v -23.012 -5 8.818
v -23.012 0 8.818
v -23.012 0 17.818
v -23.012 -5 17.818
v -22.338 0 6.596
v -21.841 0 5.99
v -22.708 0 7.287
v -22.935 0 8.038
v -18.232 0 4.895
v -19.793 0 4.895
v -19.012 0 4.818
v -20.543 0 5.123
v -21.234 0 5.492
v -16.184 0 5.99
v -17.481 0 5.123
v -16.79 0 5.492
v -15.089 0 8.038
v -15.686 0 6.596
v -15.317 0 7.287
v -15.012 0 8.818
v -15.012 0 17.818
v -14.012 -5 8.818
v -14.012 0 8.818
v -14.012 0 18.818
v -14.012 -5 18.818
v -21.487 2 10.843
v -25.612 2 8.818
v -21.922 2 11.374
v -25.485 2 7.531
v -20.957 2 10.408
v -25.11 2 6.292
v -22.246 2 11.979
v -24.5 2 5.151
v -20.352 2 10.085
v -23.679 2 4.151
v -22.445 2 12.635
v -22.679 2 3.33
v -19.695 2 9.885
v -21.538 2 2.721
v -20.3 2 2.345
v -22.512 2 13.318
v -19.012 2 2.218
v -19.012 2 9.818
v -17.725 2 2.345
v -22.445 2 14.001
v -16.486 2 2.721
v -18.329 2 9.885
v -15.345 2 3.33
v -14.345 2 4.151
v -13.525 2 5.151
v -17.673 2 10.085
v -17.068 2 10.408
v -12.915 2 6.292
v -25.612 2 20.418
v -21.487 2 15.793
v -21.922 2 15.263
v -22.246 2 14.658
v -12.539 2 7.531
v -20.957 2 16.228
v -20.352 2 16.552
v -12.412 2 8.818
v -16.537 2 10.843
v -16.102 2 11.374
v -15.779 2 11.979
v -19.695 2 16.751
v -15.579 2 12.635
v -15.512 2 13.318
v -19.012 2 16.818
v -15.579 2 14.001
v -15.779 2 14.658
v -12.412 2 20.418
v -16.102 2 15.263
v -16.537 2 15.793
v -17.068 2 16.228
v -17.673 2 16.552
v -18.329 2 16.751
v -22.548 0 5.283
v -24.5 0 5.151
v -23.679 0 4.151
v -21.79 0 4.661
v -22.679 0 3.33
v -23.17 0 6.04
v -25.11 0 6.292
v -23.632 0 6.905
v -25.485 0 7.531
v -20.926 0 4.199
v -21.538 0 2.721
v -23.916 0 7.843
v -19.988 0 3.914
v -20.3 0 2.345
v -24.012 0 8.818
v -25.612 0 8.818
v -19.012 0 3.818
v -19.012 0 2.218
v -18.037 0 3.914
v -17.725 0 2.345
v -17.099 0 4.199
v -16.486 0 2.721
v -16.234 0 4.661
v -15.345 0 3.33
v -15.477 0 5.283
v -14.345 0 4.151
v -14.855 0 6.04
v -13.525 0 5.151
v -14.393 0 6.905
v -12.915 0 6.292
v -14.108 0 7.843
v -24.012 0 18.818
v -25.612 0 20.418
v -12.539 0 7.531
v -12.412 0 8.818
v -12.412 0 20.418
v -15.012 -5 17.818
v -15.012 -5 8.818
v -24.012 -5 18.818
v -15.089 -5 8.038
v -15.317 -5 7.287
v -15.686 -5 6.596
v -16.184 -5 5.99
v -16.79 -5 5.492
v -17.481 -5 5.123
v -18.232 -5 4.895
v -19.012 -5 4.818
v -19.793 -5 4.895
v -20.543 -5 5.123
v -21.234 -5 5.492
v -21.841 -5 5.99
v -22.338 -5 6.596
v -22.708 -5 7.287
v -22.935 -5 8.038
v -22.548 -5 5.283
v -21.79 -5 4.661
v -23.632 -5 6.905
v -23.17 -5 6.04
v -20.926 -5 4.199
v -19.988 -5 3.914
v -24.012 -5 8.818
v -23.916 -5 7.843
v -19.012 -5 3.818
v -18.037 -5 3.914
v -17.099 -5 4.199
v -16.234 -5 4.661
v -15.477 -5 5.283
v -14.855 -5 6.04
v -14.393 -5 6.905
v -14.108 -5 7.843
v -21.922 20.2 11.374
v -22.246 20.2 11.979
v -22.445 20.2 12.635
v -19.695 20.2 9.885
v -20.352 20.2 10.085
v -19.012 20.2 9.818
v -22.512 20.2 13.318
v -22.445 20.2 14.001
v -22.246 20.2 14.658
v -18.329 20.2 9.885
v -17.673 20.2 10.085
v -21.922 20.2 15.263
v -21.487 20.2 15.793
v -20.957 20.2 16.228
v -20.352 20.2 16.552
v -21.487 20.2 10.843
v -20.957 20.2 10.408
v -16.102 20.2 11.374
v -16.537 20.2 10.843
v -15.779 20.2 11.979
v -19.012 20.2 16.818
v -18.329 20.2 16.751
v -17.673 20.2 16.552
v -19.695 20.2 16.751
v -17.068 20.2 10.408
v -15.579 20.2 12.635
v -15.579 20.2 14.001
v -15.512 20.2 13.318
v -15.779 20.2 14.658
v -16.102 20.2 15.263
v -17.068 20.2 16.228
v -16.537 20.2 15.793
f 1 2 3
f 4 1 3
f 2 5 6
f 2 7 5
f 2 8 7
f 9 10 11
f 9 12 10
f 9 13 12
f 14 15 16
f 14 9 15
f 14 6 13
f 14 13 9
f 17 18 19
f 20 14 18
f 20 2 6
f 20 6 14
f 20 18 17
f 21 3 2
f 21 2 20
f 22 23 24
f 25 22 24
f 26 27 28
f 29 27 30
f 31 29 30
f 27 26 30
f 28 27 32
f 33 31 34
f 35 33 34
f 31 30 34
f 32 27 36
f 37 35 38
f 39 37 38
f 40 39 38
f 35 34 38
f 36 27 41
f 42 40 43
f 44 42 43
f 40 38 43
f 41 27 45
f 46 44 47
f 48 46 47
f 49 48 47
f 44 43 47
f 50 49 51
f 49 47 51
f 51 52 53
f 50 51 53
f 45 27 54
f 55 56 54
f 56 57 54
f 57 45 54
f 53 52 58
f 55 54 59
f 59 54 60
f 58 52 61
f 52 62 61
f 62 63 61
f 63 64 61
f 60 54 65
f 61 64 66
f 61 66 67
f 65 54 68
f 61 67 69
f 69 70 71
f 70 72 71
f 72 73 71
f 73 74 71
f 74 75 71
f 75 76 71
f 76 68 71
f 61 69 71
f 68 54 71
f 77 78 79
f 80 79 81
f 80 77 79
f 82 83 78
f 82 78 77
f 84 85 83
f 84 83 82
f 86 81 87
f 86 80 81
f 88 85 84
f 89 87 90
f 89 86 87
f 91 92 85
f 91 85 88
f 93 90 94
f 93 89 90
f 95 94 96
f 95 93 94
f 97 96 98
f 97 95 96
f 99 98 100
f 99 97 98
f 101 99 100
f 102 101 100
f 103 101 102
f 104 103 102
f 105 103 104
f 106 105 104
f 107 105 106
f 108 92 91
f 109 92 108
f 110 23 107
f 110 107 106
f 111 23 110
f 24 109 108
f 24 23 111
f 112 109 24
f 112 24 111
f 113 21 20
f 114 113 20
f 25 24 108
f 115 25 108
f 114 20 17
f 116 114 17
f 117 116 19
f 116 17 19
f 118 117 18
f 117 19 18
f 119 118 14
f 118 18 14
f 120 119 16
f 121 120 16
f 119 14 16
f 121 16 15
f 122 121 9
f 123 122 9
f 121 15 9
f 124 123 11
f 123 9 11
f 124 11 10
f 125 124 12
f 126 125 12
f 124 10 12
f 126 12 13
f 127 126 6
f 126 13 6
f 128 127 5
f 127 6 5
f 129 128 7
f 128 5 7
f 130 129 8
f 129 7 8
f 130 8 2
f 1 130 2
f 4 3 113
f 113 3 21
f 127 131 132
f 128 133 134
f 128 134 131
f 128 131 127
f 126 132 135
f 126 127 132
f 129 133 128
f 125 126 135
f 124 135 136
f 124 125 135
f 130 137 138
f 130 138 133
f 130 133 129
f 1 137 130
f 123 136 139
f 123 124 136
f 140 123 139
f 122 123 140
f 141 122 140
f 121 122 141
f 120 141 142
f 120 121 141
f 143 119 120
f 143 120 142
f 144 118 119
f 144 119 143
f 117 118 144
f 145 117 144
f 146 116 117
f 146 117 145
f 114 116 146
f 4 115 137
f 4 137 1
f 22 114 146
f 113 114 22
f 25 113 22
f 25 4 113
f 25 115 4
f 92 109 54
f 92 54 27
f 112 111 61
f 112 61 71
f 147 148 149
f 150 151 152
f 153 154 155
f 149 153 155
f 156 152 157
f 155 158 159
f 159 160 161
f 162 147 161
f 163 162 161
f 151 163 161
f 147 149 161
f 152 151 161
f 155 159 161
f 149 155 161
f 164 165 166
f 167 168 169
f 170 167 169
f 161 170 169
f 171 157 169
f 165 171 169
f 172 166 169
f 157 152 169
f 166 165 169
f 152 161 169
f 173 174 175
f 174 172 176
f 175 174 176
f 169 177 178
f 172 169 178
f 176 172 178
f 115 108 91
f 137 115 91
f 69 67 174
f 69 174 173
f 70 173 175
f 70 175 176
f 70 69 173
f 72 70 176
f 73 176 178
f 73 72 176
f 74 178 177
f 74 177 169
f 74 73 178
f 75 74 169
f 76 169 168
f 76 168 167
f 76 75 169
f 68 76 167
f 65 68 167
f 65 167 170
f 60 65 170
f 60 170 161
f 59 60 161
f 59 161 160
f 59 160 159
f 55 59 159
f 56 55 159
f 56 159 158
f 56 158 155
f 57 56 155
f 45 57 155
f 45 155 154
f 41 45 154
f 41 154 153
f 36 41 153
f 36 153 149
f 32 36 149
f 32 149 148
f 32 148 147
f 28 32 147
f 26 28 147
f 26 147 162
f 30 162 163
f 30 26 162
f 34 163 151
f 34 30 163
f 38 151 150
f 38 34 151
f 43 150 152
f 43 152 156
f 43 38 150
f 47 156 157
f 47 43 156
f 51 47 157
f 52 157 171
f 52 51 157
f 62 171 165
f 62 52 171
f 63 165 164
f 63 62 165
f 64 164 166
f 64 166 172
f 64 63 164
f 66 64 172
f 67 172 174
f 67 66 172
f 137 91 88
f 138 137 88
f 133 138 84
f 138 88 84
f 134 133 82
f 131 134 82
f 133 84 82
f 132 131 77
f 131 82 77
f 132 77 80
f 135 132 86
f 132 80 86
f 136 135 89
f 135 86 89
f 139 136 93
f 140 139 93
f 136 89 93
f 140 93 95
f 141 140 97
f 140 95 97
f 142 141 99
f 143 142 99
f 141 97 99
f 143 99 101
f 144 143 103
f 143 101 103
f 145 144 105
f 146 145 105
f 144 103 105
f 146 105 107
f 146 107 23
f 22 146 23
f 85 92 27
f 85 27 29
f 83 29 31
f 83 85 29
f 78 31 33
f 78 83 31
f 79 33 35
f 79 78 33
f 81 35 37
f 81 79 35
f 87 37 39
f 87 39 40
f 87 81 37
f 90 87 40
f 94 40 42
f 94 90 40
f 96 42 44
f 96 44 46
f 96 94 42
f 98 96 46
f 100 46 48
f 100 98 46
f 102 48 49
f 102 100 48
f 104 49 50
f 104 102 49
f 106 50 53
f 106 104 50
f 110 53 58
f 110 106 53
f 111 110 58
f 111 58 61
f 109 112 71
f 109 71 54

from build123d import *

# Parameters (mm, degrees)
F0_R     = 3.5
F1_DEPTH = 2
F2_DEPTH = 5
F3_DEPTH = 20.2


with BuildPart() as f1:
    # F0 (on Front) → F1 (new body)
    with BuildSketch(Plane.XZ):
        with BuildLine():
            Line((-12.4122027444, 20.418163389), (-25.6122041357, 20.418163389))
            Line((-25.6122041357, 20.418163389), (-25.6122041357, 8.8181626933))
            ThreePointArc((-25.6122041357, 8.8181626933), (-19.0122034401, 2.2181619977), (-12.4122027444, 8.8181626933))
            Line((-12.4122027444, 8.8181626933), (-12.4122027444, 20.418163389))
        make_face()
        with BuildLine():
            Line((-24.0122034401, 8.8181626933), (-24.0122034401, 18.8181626933))
            Line((-24.0122034401, 18.8181626933), (-14.0122034401, 18.8181626933))
            Line((-14.0122034401, 18.8181626933), (-14.0122034401, 8.8181626933))
            ThreePointArc((-14.0122034401, 8.8181626933), (-19.0122034401, 3.8181626933), (-24.0122034401, 8.8181626933))
        make_face(mode=Mode.SUBTRACT)
        with BuildLine():
            Line((-14.0122034401, 18.8181626933), (-24.0122034401, 18.8181626933))
            Line((-24.0122034401, 18.8181626933), (-24.0122034401, 8.8181626933))
            ThreePointArc((-24.0122034401, 8.8181626933), (-19.0122034401, 3.8181626933), (-14.0122034401, 8.8181626933))
            Line((-14.0122034401, 8.8181626933), (-14.0122034401, 18.8181626933))
        make_face()
        with BuildLine():
            Line((-23.0122034401, 8.8181626933), (-23.0122034401, 17.8181626933))
            Line((-23.0122034401, 17.8181626933), (-15.0122034401, 17.8181626933))
            Line((-15.0122034401, 17.8181626933), (-15.0122034401, 8.8181626933))
            ThreePointArc((-15.0122034401, 8.8181626933), (-19.0122034401, 4.8181626933), (-23.0122034401, 8.8181626933))
        make_face(mode=Mode.SUBTRACT)
        with BuildLine():
            Line((-15.0122034401, 17.8181626933), (-23.0122034401, 17.8181626933))
            Line((-23.0122034401, 17.8181626933), (-23.0122034401, 8.8181626933))
            ThreePointArc((-23.0122034401, 8.8181626933), (-19.0122034401, 4.8181626933), (-15.0122034401, 8.8181626933))
            Line((-15.0122034401, 8.8181626933), (-15.0122034401, 17.8181626933))
        make_face()
        with Locations((-19.0122034401, 13.3181626933)):
            Circle(F0_R, mode=Mode.SUBTRACT)
    extrude(amount=-F1_DEPTH)

    # F0 (on Front) → F2 (join)
    with BuildSketch(Plane.XZ):
        with BuildLine():
            Line((-14.0122034401, 18.8181626933), (-24.0122034401, 18.8181626933))
            Line((-24.0122034401, 18.8181626933), (-24.0122034401, 8.8181626933))
            ThreePointArc((-24.0122034401, 8.8181626933), (-19.0122034401, 3.8181626933), (-14.0122034401, 8.8181626933))
            Line((-14.0122034401, 8.8181626933), (-14.0122034401, 18.8181626933))
        make_face()
        with BuildLine():
            Line((-23.0122034401, 8.8181626933), (-23.0122034401, 17.8181626933))
            Line((-23.0122034401, 17.8181626933), (-15.0122034401, 17.8181626933))
            Line((-15.0122034401, 17.8181626933), (-15.0122034401, 8.8181626933))
            ThreePointArc((-15.0122034401, 8.8181626933), (-19.0122034401, 4.8181626933), (-23.0122034401, 8.8181626933))
        make_face(mode=Mode.SUBTRACT)
    extrude(amount=F2_DEPTH)

    # F0 (on Front) → F3 (join)
    with BuildSketch(Plane.XZ):
        with Locations((-19.0122034401, 13.3181626933)):
            Circle(F0_R)
    extrude(amount=-F3_DEPTH)


solid = f1.part
